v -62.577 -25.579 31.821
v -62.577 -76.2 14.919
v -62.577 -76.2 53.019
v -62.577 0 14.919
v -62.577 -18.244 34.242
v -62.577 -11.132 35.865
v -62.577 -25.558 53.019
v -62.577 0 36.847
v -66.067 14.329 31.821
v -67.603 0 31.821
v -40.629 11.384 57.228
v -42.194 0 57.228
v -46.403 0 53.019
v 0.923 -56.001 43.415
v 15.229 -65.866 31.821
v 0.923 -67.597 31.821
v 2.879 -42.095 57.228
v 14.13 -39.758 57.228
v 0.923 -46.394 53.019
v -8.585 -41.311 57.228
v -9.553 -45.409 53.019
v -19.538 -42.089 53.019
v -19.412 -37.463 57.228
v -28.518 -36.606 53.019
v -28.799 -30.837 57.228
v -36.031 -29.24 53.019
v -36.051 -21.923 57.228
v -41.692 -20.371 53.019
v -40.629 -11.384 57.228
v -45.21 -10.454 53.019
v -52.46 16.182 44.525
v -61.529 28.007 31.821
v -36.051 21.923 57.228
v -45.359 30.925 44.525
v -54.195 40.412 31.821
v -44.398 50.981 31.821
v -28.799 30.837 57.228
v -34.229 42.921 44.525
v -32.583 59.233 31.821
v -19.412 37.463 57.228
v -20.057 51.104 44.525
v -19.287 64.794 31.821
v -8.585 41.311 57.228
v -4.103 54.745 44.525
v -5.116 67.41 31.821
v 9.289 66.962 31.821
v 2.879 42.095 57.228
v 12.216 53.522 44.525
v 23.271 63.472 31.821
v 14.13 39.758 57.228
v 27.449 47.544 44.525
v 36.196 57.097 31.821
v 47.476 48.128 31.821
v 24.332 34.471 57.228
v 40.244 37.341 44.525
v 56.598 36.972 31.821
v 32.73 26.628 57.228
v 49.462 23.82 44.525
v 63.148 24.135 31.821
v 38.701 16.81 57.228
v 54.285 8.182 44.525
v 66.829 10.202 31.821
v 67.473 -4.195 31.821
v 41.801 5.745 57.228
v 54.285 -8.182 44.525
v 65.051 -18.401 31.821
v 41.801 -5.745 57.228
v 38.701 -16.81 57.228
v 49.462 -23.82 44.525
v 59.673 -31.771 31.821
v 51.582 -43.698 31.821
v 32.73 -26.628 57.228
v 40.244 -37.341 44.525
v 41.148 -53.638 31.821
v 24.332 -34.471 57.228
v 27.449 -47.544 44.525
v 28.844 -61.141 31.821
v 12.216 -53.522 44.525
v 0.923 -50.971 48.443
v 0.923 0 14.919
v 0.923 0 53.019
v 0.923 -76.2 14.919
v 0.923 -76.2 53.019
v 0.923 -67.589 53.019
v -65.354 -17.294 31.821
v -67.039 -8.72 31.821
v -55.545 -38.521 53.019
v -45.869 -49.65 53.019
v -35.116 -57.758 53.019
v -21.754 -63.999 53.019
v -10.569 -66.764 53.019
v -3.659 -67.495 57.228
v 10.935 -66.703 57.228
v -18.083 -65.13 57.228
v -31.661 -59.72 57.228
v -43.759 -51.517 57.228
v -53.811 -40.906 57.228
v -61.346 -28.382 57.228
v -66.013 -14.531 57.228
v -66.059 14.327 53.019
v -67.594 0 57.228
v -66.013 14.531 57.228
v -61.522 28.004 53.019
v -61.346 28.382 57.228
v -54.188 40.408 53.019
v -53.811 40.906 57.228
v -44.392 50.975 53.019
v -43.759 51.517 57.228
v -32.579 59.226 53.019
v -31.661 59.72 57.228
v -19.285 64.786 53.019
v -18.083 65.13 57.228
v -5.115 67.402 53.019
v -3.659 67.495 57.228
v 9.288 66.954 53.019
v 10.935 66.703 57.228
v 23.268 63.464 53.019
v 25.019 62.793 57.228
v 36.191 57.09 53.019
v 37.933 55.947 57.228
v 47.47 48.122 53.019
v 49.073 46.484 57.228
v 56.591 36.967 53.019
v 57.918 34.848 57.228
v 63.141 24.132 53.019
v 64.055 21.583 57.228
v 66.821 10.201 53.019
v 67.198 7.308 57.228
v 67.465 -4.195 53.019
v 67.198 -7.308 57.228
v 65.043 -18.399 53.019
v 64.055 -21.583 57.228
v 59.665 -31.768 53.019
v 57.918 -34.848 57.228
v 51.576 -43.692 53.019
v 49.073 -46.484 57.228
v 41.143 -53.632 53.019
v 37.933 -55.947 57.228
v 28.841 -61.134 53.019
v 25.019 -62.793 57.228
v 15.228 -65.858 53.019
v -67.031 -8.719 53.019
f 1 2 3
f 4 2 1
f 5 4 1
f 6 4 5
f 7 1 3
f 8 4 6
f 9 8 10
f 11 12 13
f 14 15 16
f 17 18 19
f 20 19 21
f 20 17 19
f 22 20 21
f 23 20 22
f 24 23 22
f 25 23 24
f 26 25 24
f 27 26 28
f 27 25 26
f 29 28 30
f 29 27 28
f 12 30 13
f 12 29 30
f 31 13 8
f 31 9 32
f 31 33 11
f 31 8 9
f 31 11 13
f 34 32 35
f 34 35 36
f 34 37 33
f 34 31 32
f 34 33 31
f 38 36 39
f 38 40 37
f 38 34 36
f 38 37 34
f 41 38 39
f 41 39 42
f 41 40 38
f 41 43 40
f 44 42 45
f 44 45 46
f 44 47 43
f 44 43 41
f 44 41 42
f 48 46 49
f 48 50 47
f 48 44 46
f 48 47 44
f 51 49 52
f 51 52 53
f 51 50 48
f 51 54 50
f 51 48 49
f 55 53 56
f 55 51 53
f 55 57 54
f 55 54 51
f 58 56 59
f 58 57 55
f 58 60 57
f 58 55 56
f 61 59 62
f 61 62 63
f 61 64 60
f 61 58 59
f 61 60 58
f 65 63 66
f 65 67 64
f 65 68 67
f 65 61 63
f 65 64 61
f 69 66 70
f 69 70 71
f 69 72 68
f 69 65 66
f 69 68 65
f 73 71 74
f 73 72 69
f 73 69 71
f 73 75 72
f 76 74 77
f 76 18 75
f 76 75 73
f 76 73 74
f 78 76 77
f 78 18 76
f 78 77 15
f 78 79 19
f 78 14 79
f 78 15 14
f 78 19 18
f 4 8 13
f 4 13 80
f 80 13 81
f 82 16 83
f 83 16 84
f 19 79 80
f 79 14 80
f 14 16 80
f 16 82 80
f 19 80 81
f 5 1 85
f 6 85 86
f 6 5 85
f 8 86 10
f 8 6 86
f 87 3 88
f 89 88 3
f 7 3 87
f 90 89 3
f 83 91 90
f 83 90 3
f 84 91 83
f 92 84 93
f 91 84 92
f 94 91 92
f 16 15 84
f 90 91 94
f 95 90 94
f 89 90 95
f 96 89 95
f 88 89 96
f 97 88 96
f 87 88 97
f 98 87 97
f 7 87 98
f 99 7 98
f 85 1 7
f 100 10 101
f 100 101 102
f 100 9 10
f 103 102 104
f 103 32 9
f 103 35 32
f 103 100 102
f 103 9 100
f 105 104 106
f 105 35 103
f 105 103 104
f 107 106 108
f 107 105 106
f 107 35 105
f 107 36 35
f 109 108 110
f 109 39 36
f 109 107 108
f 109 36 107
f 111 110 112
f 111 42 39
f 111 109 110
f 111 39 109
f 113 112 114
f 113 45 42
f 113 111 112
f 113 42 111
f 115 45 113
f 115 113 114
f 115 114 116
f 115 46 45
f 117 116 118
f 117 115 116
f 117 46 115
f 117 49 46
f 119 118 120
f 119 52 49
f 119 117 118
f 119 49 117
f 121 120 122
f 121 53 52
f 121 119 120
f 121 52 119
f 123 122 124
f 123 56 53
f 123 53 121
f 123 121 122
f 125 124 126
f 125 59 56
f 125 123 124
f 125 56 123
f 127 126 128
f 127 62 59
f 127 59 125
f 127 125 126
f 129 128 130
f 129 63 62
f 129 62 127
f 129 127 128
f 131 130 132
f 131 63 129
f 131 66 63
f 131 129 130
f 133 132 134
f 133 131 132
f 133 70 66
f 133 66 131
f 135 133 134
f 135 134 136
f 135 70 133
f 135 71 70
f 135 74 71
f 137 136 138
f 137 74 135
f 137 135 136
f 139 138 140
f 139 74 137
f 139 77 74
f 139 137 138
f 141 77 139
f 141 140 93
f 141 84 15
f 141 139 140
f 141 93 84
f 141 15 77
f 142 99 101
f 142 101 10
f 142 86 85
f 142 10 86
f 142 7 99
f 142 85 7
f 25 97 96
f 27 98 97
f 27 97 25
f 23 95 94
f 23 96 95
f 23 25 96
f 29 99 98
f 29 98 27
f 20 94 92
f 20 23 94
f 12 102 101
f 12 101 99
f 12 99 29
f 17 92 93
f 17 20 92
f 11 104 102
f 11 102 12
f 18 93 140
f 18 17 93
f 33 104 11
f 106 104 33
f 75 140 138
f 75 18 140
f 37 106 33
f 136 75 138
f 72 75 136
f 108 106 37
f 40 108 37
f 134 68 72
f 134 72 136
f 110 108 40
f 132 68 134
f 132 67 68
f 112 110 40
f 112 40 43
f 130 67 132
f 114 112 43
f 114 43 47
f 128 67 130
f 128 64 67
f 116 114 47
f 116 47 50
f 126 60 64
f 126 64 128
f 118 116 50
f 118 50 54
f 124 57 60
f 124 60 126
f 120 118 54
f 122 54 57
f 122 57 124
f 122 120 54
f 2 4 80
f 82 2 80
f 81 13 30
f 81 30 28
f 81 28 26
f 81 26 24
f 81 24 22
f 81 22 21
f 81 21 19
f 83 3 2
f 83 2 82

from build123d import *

# Parameters (mm, degrees)
F0_W     = 63.5
F0_H     = 38.1
F1_DEPTH = 76.2


with BuildPart() as f1:
    # F0 (on Front) → F1 (new body)
    with BuildSketch(Plane.XZ):
        with Locations((-30.827382, 33.969355)):
            Rectangle(F0_W, F0_H)
    extrude(amount=F1_DEPTH)

    # F2 (on Front) → F3 (revolve)
    with BuildSketch(Plane.XZ):
        Polygon((-67.593754, 57.227799), (-67.603478, 31.821309), (-42.193754, 57.227799), align=None)
    revolve(axis=Axis((0, 0, -39.142155), (0, 0, -1)))


solid = f1.part
